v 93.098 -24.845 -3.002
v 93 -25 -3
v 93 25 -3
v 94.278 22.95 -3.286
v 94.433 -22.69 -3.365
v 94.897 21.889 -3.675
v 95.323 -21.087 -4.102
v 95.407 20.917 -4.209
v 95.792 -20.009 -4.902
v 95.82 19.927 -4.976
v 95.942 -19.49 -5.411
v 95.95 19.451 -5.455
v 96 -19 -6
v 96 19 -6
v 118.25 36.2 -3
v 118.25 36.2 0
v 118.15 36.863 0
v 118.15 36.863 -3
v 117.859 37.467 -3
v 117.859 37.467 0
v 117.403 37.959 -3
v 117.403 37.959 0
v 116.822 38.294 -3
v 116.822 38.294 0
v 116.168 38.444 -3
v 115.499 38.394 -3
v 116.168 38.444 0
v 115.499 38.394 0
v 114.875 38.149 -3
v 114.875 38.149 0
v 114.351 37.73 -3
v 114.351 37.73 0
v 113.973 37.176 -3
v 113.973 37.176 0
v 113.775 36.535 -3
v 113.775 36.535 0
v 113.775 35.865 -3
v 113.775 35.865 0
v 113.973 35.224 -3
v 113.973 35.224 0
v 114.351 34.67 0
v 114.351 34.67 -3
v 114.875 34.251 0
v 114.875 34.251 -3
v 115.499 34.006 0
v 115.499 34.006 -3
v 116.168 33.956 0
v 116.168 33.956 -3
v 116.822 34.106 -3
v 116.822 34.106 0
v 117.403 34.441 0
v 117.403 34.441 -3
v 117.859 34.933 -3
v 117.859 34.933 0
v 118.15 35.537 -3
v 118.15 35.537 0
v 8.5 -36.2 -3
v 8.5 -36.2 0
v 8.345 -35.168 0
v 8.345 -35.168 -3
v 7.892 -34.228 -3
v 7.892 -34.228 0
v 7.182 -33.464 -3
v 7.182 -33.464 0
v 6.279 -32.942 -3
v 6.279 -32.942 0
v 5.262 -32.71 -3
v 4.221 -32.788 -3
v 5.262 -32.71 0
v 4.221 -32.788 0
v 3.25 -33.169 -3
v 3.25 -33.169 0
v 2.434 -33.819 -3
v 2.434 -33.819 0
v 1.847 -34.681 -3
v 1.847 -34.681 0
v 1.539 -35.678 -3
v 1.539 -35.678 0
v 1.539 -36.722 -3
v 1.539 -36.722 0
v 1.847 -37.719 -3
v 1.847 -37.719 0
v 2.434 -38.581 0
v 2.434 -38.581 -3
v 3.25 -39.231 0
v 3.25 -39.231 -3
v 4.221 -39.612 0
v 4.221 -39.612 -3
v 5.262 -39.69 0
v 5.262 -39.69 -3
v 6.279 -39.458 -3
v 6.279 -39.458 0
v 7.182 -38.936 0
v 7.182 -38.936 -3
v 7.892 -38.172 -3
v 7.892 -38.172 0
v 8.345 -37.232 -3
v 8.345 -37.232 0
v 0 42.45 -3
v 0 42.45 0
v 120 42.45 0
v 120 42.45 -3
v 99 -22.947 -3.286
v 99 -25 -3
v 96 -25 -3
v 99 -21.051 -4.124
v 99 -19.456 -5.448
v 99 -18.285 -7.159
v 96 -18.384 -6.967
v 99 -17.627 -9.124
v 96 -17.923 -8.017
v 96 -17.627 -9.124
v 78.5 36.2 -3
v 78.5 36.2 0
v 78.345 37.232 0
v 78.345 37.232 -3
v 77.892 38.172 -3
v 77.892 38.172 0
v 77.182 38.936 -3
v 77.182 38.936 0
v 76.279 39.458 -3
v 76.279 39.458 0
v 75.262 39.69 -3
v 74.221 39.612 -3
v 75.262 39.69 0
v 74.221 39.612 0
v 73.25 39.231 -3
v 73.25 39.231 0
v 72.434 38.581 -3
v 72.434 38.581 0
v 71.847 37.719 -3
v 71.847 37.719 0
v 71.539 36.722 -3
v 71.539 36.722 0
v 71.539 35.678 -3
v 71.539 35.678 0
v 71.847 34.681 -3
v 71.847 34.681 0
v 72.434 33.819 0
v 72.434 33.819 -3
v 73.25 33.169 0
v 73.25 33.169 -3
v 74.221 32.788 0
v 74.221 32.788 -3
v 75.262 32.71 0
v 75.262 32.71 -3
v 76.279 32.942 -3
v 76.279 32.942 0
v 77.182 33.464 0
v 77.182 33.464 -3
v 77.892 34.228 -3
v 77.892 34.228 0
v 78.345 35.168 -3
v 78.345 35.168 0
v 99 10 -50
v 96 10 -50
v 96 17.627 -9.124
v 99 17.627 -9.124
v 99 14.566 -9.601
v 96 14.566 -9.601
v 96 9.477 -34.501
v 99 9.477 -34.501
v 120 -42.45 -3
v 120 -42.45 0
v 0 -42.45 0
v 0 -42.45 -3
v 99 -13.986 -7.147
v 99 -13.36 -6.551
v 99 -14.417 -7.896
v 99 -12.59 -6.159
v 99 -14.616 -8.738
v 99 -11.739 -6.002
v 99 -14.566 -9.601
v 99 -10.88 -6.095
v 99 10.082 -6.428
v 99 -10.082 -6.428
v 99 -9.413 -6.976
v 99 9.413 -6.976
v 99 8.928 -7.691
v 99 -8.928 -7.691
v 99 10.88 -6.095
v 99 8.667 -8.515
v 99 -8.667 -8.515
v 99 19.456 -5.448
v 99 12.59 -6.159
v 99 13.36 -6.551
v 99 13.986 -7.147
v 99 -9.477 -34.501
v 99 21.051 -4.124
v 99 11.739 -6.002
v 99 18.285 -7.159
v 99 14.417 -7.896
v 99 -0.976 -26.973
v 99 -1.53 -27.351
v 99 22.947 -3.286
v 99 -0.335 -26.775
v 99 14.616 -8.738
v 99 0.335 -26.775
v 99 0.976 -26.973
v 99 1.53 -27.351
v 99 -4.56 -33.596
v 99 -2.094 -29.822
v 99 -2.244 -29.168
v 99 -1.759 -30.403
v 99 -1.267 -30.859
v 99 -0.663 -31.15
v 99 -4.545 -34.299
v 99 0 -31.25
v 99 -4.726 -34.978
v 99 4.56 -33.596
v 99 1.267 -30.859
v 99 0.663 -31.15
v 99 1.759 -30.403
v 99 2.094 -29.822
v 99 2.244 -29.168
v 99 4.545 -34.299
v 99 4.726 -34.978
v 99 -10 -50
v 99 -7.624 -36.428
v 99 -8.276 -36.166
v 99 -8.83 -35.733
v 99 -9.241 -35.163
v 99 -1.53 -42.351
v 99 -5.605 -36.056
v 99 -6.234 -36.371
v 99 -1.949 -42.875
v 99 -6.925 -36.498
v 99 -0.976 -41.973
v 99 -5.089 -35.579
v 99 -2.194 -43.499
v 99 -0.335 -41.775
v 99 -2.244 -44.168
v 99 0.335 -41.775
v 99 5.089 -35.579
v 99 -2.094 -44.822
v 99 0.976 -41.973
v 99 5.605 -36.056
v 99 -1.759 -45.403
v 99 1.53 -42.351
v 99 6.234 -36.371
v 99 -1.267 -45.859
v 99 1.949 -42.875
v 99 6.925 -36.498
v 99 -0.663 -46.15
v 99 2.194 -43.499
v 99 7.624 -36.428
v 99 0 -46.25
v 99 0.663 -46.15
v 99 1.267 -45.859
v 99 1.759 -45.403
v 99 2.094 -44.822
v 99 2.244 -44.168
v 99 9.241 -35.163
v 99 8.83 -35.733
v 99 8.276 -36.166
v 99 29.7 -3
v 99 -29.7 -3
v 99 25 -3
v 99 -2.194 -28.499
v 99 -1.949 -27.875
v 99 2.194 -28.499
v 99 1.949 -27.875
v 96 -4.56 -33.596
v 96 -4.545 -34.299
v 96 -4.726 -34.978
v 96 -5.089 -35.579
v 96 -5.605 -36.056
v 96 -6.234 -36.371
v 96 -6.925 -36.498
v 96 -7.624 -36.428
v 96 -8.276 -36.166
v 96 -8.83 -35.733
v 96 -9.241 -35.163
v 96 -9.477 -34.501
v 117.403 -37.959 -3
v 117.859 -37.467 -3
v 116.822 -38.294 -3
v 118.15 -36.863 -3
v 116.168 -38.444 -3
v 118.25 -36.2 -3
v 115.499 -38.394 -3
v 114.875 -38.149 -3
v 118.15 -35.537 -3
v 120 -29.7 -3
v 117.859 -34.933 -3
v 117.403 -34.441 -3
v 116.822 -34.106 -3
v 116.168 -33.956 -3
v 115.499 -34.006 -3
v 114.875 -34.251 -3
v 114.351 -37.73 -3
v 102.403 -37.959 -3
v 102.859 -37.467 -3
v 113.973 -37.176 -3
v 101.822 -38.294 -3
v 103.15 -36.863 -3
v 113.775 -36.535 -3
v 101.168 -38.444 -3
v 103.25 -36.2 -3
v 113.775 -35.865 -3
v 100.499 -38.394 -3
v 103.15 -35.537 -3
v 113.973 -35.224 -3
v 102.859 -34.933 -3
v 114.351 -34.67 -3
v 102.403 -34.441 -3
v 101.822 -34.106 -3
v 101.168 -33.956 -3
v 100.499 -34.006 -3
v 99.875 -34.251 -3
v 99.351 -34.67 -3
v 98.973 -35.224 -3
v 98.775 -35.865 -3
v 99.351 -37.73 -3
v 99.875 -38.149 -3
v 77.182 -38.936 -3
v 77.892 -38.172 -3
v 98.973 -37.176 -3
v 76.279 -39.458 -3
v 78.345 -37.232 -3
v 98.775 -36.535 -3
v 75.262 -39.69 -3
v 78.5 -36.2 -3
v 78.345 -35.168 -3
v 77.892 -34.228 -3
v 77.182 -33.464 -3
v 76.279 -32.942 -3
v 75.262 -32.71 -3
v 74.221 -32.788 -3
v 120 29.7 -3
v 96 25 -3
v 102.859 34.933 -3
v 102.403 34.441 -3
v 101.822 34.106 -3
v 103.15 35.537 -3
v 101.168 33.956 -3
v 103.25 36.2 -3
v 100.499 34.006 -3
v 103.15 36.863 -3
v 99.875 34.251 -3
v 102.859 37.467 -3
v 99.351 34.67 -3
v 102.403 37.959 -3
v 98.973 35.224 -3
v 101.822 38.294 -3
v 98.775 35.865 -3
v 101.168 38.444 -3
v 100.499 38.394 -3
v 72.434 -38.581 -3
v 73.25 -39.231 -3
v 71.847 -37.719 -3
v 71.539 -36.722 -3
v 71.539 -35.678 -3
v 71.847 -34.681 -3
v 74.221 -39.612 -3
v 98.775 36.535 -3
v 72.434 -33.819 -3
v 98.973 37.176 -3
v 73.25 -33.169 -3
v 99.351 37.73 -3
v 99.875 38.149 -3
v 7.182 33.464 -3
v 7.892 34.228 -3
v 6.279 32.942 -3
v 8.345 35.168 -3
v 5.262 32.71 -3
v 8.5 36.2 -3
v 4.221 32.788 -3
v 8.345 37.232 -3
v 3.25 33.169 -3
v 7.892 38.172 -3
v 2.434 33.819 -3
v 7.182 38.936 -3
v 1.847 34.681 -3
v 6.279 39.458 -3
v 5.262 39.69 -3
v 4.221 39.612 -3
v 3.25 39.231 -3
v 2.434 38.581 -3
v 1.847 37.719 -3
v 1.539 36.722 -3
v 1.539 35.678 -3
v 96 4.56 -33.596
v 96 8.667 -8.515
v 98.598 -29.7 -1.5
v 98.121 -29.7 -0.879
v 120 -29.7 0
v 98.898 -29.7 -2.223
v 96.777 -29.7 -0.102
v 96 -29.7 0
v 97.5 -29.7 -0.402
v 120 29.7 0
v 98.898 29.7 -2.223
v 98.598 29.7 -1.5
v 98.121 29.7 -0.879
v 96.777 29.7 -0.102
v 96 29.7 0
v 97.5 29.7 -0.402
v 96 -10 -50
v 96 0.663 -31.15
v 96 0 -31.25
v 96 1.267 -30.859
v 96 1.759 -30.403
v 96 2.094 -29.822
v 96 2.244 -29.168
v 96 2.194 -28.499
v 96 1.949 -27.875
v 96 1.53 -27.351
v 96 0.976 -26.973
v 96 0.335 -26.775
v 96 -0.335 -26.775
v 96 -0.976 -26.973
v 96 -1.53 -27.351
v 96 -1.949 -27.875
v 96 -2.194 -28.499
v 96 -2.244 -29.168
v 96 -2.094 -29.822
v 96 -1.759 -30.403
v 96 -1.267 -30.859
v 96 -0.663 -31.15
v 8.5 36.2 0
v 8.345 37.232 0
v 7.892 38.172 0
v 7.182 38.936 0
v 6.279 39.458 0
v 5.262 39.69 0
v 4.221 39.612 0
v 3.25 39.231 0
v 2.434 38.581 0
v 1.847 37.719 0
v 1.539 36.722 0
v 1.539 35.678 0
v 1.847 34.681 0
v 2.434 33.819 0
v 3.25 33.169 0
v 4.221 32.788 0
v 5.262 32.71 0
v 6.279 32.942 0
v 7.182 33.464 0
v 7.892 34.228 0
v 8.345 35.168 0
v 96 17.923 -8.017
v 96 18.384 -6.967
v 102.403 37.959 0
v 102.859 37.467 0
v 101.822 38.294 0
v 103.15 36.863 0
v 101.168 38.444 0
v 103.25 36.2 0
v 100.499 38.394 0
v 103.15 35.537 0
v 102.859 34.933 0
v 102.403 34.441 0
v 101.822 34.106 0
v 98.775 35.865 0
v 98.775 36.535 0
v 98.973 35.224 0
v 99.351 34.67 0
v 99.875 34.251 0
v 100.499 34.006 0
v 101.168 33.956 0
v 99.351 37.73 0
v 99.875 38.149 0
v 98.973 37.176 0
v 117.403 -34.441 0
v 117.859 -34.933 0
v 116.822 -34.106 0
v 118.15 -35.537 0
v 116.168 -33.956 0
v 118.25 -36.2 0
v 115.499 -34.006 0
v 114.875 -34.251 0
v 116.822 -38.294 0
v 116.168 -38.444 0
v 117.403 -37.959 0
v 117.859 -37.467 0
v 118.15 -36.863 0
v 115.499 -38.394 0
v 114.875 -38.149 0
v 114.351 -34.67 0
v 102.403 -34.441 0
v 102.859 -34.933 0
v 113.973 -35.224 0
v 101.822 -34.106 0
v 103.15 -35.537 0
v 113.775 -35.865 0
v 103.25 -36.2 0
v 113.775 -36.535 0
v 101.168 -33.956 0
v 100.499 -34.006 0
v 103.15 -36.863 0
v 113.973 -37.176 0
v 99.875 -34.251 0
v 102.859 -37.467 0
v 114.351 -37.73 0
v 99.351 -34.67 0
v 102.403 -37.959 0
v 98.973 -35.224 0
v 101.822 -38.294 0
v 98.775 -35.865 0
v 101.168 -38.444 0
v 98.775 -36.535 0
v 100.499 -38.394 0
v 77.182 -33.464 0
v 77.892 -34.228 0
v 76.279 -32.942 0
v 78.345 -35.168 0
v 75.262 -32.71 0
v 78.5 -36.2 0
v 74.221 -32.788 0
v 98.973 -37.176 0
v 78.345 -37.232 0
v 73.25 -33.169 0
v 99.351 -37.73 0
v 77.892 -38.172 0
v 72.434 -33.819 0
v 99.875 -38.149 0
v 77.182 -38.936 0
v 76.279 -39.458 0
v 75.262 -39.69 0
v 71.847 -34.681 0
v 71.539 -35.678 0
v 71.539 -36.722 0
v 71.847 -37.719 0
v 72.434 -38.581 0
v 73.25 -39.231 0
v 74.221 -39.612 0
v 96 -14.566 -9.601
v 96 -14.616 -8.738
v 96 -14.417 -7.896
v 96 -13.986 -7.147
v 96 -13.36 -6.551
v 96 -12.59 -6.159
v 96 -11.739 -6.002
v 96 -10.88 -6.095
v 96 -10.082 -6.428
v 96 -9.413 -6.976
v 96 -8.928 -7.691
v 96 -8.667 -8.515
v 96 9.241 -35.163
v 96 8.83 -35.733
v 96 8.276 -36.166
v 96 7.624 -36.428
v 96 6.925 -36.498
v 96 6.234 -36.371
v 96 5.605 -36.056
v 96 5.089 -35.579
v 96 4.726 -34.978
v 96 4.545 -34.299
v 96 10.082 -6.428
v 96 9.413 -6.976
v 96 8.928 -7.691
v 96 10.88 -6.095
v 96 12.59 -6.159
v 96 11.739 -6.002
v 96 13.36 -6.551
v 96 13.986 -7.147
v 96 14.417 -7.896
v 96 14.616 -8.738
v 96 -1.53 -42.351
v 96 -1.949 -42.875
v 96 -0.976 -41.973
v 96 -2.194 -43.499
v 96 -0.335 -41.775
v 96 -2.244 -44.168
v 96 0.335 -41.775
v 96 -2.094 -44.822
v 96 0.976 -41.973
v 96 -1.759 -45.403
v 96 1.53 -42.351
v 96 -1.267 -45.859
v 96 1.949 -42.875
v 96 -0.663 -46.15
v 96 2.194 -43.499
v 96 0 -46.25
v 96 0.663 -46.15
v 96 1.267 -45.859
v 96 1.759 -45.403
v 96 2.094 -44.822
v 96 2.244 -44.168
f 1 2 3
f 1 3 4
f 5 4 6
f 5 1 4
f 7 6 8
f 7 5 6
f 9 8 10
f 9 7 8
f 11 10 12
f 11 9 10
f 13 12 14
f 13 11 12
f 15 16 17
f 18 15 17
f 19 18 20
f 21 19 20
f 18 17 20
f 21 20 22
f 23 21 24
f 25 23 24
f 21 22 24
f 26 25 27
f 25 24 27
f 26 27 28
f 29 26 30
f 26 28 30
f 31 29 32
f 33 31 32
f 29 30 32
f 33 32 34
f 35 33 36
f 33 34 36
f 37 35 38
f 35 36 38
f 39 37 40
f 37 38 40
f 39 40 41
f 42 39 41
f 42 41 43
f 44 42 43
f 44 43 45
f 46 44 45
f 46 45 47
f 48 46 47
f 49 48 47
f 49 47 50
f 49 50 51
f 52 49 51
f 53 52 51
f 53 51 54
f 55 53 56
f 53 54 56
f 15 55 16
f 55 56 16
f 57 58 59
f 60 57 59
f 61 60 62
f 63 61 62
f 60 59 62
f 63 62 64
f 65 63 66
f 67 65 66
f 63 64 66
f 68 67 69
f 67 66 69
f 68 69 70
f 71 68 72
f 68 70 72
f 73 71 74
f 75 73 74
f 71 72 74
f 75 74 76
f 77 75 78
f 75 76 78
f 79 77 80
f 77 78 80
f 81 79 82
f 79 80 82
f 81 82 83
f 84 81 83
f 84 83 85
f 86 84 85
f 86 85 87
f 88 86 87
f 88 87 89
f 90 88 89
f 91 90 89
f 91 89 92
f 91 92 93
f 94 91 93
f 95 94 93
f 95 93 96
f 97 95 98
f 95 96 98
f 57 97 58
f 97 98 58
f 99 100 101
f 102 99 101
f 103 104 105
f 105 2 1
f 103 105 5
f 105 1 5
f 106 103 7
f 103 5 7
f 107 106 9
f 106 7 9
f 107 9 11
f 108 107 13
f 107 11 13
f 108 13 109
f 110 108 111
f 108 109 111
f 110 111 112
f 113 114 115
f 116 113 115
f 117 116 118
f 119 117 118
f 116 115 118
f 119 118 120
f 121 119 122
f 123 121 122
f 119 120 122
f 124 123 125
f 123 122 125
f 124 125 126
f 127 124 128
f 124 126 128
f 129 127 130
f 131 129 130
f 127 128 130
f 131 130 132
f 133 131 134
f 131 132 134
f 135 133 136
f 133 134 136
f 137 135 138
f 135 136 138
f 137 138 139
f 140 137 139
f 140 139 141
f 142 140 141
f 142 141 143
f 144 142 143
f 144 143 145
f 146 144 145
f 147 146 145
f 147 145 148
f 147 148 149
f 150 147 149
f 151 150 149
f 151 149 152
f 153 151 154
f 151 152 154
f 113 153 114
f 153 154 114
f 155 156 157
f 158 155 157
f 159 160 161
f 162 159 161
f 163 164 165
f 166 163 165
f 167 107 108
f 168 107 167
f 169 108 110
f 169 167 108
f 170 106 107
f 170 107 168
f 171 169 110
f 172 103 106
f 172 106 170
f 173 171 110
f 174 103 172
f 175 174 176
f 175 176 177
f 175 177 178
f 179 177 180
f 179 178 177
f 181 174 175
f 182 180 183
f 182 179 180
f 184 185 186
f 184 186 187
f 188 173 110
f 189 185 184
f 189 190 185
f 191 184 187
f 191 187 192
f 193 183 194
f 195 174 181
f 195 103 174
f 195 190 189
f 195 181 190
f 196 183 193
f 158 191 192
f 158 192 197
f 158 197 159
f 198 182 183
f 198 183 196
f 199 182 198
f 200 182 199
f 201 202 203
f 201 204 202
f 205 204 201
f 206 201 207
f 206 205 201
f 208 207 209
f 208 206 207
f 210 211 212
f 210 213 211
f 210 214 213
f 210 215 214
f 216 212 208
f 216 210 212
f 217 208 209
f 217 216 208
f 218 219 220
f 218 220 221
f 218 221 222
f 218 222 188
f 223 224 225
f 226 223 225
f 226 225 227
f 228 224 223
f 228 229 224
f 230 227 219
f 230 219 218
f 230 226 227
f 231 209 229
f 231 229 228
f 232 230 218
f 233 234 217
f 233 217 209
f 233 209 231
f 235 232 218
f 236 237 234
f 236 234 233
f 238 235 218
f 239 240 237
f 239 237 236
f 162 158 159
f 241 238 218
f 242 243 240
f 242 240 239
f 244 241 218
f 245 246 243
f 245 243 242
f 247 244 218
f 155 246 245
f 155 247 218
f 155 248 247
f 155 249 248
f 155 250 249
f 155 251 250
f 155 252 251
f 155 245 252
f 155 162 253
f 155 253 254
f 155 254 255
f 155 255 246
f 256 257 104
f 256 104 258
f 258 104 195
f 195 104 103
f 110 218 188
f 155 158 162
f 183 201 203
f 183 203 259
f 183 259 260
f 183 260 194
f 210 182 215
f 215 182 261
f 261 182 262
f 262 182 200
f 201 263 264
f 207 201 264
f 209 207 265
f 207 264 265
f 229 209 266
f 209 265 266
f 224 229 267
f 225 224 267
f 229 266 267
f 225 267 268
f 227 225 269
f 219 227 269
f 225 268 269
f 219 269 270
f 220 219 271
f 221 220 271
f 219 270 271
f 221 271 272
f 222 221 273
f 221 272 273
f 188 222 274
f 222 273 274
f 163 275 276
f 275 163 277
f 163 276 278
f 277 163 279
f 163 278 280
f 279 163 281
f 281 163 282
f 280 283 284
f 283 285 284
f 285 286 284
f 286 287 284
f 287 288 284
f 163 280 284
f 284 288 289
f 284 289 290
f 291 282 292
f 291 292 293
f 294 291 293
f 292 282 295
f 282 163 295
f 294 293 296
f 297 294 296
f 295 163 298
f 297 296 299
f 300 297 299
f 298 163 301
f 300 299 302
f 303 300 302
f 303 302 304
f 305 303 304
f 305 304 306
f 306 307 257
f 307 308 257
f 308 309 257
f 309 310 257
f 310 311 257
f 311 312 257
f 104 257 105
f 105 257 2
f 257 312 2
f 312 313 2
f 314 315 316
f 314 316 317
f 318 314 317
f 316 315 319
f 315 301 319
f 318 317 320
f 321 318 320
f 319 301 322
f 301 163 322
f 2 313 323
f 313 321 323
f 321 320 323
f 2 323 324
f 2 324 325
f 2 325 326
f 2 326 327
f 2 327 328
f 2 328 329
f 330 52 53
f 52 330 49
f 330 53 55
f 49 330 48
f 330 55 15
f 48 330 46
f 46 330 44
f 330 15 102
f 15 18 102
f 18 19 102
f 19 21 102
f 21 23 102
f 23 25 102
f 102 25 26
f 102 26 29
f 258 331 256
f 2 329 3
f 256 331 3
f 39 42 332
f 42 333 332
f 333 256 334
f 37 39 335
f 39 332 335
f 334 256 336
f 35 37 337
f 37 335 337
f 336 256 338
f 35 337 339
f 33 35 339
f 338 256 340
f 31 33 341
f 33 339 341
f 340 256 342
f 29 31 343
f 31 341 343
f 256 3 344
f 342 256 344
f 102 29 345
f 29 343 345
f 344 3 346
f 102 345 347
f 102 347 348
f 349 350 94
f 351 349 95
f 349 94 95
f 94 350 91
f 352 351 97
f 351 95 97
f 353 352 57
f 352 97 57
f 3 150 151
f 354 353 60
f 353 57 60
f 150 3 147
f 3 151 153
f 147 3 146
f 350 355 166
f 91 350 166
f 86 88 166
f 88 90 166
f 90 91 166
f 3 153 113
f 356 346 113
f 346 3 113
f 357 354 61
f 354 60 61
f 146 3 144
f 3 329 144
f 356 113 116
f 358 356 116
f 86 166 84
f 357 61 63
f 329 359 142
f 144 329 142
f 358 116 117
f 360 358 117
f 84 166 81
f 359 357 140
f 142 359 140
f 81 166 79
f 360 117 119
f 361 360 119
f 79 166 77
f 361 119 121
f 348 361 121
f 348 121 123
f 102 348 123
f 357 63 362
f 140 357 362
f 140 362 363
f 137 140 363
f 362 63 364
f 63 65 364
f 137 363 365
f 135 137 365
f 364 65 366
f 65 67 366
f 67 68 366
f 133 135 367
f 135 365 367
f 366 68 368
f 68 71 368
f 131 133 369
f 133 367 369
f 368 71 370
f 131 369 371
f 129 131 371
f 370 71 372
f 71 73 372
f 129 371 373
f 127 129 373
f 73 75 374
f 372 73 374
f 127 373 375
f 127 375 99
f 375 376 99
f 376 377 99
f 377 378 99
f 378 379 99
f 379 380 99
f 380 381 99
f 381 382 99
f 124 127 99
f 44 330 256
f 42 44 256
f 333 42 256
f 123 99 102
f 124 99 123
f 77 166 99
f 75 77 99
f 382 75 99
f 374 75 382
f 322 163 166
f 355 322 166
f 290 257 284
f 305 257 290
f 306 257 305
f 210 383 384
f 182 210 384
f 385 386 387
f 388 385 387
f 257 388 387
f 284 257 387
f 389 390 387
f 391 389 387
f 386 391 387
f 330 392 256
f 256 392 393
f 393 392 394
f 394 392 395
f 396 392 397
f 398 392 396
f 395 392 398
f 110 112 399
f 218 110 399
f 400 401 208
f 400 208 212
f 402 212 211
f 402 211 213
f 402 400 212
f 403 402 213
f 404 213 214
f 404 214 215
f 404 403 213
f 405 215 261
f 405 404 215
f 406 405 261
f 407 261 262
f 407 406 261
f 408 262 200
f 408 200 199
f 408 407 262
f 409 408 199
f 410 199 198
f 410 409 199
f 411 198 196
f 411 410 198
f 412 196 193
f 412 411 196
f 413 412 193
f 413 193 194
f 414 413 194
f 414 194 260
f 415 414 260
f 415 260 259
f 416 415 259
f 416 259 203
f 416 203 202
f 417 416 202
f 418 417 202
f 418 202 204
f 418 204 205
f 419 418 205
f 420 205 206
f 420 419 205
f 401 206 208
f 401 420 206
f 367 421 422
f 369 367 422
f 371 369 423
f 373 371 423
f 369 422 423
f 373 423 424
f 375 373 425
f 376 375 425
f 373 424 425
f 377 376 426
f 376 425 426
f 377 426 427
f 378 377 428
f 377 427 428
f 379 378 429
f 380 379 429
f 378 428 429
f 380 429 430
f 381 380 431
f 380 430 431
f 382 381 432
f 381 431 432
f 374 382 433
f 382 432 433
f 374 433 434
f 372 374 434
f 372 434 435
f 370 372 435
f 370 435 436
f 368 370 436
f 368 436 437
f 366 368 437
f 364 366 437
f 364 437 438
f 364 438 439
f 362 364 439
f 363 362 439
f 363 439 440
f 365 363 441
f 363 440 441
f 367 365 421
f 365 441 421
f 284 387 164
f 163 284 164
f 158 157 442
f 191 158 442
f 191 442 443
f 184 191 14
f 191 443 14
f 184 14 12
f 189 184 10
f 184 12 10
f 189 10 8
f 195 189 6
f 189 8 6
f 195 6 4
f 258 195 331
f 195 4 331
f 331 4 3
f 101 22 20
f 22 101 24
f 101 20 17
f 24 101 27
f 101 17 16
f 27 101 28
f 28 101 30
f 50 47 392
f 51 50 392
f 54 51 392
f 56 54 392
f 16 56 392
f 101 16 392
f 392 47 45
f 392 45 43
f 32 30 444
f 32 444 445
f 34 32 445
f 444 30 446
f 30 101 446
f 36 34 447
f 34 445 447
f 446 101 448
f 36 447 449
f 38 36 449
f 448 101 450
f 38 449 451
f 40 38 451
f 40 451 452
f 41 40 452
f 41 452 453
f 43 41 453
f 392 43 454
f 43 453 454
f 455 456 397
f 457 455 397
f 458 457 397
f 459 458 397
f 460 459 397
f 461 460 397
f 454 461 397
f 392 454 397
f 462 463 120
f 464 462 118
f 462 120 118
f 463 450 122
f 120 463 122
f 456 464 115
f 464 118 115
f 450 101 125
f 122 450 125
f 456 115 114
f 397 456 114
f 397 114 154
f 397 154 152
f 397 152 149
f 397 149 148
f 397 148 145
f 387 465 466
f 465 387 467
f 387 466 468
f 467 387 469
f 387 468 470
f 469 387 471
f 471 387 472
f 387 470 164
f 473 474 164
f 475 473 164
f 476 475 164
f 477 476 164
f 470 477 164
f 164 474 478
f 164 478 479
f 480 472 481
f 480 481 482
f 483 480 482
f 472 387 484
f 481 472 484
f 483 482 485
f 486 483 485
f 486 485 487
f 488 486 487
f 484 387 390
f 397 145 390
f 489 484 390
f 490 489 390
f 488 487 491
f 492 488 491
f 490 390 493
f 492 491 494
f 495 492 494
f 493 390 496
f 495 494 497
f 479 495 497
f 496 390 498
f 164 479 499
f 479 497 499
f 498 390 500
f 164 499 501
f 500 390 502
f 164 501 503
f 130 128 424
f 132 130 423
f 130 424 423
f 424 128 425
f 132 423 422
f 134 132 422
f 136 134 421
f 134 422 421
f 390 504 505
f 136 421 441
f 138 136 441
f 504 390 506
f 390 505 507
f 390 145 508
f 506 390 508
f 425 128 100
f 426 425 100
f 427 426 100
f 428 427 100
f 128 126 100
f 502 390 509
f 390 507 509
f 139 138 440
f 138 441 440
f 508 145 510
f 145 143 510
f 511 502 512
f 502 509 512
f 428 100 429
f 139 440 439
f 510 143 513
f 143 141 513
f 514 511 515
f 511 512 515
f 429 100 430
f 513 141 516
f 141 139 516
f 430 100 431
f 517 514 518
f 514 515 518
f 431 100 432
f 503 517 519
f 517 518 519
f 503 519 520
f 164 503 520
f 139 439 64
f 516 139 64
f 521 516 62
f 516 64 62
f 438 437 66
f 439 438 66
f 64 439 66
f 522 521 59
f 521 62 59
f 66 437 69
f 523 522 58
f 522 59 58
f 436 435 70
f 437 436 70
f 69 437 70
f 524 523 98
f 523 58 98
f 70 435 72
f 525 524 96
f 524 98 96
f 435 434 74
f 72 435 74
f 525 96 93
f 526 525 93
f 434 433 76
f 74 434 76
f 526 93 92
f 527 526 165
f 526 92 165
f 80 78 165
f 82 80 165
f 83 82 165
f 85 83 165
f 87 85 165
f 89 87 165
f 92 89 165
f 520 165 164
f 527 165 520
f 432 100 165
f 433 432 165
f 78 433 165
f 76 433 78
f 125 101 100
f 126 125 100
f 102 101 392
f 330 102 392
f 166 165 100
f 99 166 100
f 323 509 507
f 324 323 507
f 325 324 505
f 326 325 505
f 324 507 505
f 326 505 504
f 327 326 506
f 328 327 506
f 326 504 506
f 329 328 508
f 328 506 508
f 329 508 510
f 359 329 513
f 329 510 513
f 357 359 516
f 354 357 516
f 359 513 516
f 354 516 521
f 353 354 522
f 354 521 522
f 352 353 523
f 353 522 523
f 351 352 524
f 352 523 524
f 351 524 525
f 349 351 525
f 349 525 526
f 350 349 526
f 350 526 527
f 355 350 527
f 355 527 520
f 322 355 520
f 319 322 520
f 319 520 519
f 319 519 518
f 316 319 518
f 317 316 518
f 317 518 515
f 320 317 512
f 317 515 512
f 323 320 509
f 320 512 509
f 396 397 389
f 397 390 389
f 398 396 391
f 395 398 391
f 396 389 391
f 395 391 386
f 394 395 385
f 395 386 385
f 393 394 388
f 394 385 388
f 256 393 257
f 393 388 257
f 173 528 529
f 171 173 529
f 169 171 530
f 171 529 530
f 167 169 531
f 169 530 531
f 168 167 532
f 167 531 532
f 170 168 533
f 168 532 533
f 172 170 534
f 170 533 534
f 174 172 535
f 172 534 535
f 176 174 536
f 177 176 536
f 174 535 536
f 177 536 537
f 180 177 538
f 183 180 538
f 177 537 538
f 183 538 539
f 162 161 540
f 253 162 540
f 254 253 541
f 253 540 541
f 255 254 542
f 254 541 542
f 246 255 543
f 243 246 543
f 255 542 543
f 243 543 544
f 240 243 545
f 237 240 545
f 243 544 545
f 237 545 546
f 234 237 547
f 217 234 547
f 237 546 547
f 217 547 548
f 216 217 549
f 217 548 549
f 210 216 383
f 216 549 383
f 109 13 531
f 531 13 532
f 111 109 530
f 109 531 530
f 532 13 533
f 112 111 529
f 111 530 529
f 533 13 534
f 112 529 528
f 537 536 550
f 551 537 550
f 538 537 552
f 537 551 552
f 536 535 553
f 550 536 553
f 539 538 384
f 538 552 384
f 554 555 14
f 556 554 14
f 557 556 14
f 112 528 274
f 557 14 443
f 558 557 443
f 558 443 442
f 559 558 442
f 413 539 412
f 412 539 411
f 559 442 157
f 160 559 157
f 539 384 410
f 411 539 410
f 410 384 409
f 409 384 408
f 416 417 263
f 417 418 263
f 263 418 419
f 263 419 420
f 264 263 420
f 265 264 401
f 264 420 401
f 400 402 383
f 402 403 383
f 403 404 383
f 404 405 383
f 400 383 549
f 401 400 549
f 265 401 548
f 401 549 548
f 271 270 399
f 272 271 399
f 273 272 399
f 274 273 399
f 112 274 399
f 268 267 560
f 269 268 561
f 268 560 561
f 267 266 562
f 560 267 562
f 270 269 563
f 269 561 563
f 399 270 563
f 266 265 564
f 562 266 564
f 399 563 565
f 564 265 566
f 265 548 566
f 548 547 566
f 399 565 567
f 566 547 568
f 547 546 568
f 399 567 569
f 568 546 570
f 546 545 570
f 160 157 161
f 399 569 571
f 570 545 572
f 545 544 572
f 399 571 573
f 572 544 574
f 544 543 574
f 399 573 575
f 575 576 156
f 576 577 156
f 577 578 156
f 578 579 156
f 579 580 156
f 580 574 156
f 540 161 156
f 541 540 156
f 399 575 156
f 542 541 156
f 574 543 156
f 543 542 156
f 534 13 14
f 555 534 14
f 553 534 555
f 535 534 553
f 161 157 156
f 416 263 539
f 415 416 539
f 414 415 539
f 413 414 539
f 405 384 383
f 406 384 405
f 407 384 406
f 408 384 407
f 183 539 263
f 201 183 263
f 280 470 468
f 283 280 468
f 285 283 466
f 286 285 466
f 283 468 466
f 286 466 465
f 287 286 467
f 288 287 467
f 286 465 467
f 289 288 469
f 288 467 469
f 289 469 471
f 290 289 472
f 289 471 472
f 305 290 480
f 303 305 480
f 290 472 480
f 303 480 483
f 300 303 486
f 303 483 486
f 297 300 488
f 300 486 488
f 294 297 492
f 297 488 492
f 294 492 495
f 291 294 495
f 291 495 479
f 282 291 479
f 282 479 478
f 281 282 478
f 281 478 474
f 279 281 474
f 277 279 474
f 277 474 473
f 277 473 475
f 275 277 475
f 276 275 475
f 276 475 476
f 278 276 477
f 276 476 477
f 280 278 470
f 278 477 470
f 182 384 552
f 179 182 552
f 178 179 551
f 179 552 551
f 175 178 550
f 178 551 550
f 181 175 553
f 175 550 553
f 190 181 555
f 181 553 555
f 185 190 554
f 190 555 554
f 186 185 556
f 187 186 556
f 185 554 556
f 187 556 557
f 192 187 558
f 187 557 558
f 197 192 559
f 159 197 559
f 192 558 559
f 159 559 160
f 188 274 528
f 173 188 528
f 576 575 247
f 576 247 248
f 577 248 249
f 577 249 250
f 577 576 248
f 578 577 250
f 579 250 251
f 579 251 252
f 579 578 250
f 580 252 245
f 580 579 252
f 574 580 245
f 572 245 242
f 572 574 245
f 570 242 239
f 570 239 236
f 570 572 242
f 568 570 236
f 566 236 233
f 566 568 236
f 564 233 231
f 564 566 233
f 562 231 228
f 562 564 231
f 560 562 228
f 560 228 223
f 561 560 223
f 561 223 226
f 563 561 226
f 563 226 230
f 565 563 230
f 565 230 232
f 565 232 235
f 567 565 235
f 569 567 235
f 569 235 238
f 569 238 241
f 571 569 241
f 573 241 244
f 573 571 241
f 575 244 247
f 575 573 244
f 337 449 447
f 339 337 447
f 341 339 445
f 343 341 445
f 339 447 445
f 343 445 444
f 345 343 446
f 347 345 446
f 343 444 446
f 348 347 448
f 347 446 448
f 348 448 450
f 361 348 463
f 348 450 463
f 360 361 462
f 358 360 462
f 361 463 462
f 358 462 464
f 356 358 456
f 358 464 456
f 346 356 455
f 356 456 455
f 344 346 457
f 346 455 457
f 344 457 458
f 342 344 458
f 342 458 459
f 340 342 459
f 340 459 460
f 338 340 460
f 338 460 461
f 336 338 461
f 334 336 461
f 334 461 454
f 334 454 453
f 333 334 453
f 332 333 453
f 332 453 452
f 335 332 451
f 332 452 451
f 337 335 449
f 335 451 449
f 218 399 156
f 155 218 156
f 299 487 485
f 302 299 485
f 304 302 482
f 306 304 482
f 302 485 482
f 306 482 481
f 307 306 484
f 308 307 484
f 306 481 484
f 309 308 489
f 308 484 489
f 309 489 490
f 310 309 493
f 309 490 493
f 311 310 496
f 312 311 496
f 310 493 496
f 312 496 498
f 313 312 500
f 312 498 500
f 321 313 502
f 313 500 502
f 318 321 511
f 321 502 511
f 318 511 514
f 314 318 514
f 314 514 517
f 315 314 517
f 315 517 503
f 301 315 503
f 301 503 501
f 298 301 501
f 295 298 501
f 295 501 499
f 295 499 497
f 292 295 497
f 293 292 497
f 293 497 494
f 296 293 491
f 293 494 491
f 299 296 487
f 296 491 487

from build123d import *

# Parameters (mm, degrees)
SKETCH1_R           = 3.5
SKETCH1_R_2         = 2.25
BOSS_EXTRUDE1_DEPTH = 3
SKETCH3_R           = 2.25
BOSS_EXTRUDE2_DEPTH = 3
FILLET1_R           = 3
FILLET2_R           = 3


with BuildPart() as part:
    # Sketch1 → Boss-Extrude1 (new body)
    with BuildSketch(Plane.XY):
        Polygon((120, 29.7), (96, 29.7), (96, -29.7), (120, -29.7), (120, -42.45), (0, -42.45), (0, 42.45), (120, 42.45), align=None)
        with Locations((5, 36.2)):
            Circle(SKETCH1_R, mode=Mode.SUBTRACT)
        with Locations((75, 36.2)):
            Circle(SKETCH1_R, mode=Mode.SUBTRACT)
        with Locations((5, -36.2)):
            Circle(SKETCH1_R, mode=Mode.SUBTRACT)
        with Locations((75, -36.2)):
            Circle(SKETCH1_R, mode=Mode.SUBTRACT)
        with Locations((116, 36.2)):
            Circle(SKETCH1_R_2, mode=Mode.SUBTRACT)
        with Locations((101, 36.2)):
            Circle(SKETCH1_R_2, mode=Mode.SUBTRACT)
        with Locations((101, -36.2)):
            Circle(SKETCH1_R_2, mode=Mode.SUBTRACT)
        with Locations((116, -36.2)):
            Circle(SKETCH1_R_2, mode=Mode.SUBTRACT)
    extrude(amount=-BOSS_EXTRUDE1_DEPTH)

    # Sketch3 → Boss-Extrude2 (add)
    with BuildSketch(Plane(origin=(96, 0, 0), x_dir=(0, 0, -1), z_dir=(1, 0, 0))):
        with BuildLine():
            Line((0, 29.7), (0, -29.7))
            Line((0, -29.7), (3, -29.7))
            Line((3, -29.7), (3, -25))
            ThreePointArc((3, -25), (4.730773609, -20.207711731), (9.124273828, -17.627254412))
            Line((9.124273828, -17.627254412), (50, -10))
            Line((50, -10), (50, 10))
            Line((50, 10), (9.124273828, 17.627254412))
            ThreePointArc((9.124273828, 17.627254412), (4.730773609, 20.207711731), (3, 25))
            Line((3, 25), (3, 29.7))
            Line((3, 29.7), (0, 29.7))
        make_face()
        with Locations((29, 0)):
            Circle(SKETCH3_R, mode=Mode.SUBTRACT)
        with Locations((44, 0)):
            Circle(SKETCH3_R, mode=Mode.SUBTRACT)
        with BuildLine():
            Line((9.600816641, 14.566475289), (34.500680534, 9.476605143))
            ThreePointArc((34.500680534, 9.476605143), (36.458725143, 6.574848986), (33.596044735, 4.560106232))
            Line((33.596044735, 4.560106232), (8.515253682, 8.666676596))
            ThreePointArc((8.515253682, 8.666676596), (6.049529828, 12.170140924), (9.600816641, 14.566475289))
        make_face(mode=Mode.SUBTRACT)
        with BuildLine():
            ThreePointArc((33.596044735, -4.560106232), (36.458725143, -6.574848986), (34.500680534, -9.476605143))
            Line((34.500680534, -9.476605143), (9.600816641, -14.566475289))
            ThreePointArc((9.600816641, -14.566475289), (6.049529828, -12.170140924), (8.515253682, -8.666676596))
            Line((8.515253682, -8.666676596), (33.596044735, -4.560106232))
        make_face(mode=Mode.SUBTRACT)
    extrude(amount=BOSS_EXTRUDE2_DEPTH)

    # Fillet1
    fillet1_edges = [part.edges().sort_by_distance(p)[0] for p in [
        (99, 0, 0),
    ]]
    fillet(fillet1_edges, radius=FILLET1_R - 0.0001)  # a hair under: the kernel refuses the full size

    # Fillet2
    fillet2_edges = [part.edges().sort_by_distance(p)[0] for p in [
        (96, 0, -3),
    ]]
    fillet(fillet2_edges, radius=FILLET2_R - 0.0001)  # a hair under: the kernel refuses the full size


solid = part.part
